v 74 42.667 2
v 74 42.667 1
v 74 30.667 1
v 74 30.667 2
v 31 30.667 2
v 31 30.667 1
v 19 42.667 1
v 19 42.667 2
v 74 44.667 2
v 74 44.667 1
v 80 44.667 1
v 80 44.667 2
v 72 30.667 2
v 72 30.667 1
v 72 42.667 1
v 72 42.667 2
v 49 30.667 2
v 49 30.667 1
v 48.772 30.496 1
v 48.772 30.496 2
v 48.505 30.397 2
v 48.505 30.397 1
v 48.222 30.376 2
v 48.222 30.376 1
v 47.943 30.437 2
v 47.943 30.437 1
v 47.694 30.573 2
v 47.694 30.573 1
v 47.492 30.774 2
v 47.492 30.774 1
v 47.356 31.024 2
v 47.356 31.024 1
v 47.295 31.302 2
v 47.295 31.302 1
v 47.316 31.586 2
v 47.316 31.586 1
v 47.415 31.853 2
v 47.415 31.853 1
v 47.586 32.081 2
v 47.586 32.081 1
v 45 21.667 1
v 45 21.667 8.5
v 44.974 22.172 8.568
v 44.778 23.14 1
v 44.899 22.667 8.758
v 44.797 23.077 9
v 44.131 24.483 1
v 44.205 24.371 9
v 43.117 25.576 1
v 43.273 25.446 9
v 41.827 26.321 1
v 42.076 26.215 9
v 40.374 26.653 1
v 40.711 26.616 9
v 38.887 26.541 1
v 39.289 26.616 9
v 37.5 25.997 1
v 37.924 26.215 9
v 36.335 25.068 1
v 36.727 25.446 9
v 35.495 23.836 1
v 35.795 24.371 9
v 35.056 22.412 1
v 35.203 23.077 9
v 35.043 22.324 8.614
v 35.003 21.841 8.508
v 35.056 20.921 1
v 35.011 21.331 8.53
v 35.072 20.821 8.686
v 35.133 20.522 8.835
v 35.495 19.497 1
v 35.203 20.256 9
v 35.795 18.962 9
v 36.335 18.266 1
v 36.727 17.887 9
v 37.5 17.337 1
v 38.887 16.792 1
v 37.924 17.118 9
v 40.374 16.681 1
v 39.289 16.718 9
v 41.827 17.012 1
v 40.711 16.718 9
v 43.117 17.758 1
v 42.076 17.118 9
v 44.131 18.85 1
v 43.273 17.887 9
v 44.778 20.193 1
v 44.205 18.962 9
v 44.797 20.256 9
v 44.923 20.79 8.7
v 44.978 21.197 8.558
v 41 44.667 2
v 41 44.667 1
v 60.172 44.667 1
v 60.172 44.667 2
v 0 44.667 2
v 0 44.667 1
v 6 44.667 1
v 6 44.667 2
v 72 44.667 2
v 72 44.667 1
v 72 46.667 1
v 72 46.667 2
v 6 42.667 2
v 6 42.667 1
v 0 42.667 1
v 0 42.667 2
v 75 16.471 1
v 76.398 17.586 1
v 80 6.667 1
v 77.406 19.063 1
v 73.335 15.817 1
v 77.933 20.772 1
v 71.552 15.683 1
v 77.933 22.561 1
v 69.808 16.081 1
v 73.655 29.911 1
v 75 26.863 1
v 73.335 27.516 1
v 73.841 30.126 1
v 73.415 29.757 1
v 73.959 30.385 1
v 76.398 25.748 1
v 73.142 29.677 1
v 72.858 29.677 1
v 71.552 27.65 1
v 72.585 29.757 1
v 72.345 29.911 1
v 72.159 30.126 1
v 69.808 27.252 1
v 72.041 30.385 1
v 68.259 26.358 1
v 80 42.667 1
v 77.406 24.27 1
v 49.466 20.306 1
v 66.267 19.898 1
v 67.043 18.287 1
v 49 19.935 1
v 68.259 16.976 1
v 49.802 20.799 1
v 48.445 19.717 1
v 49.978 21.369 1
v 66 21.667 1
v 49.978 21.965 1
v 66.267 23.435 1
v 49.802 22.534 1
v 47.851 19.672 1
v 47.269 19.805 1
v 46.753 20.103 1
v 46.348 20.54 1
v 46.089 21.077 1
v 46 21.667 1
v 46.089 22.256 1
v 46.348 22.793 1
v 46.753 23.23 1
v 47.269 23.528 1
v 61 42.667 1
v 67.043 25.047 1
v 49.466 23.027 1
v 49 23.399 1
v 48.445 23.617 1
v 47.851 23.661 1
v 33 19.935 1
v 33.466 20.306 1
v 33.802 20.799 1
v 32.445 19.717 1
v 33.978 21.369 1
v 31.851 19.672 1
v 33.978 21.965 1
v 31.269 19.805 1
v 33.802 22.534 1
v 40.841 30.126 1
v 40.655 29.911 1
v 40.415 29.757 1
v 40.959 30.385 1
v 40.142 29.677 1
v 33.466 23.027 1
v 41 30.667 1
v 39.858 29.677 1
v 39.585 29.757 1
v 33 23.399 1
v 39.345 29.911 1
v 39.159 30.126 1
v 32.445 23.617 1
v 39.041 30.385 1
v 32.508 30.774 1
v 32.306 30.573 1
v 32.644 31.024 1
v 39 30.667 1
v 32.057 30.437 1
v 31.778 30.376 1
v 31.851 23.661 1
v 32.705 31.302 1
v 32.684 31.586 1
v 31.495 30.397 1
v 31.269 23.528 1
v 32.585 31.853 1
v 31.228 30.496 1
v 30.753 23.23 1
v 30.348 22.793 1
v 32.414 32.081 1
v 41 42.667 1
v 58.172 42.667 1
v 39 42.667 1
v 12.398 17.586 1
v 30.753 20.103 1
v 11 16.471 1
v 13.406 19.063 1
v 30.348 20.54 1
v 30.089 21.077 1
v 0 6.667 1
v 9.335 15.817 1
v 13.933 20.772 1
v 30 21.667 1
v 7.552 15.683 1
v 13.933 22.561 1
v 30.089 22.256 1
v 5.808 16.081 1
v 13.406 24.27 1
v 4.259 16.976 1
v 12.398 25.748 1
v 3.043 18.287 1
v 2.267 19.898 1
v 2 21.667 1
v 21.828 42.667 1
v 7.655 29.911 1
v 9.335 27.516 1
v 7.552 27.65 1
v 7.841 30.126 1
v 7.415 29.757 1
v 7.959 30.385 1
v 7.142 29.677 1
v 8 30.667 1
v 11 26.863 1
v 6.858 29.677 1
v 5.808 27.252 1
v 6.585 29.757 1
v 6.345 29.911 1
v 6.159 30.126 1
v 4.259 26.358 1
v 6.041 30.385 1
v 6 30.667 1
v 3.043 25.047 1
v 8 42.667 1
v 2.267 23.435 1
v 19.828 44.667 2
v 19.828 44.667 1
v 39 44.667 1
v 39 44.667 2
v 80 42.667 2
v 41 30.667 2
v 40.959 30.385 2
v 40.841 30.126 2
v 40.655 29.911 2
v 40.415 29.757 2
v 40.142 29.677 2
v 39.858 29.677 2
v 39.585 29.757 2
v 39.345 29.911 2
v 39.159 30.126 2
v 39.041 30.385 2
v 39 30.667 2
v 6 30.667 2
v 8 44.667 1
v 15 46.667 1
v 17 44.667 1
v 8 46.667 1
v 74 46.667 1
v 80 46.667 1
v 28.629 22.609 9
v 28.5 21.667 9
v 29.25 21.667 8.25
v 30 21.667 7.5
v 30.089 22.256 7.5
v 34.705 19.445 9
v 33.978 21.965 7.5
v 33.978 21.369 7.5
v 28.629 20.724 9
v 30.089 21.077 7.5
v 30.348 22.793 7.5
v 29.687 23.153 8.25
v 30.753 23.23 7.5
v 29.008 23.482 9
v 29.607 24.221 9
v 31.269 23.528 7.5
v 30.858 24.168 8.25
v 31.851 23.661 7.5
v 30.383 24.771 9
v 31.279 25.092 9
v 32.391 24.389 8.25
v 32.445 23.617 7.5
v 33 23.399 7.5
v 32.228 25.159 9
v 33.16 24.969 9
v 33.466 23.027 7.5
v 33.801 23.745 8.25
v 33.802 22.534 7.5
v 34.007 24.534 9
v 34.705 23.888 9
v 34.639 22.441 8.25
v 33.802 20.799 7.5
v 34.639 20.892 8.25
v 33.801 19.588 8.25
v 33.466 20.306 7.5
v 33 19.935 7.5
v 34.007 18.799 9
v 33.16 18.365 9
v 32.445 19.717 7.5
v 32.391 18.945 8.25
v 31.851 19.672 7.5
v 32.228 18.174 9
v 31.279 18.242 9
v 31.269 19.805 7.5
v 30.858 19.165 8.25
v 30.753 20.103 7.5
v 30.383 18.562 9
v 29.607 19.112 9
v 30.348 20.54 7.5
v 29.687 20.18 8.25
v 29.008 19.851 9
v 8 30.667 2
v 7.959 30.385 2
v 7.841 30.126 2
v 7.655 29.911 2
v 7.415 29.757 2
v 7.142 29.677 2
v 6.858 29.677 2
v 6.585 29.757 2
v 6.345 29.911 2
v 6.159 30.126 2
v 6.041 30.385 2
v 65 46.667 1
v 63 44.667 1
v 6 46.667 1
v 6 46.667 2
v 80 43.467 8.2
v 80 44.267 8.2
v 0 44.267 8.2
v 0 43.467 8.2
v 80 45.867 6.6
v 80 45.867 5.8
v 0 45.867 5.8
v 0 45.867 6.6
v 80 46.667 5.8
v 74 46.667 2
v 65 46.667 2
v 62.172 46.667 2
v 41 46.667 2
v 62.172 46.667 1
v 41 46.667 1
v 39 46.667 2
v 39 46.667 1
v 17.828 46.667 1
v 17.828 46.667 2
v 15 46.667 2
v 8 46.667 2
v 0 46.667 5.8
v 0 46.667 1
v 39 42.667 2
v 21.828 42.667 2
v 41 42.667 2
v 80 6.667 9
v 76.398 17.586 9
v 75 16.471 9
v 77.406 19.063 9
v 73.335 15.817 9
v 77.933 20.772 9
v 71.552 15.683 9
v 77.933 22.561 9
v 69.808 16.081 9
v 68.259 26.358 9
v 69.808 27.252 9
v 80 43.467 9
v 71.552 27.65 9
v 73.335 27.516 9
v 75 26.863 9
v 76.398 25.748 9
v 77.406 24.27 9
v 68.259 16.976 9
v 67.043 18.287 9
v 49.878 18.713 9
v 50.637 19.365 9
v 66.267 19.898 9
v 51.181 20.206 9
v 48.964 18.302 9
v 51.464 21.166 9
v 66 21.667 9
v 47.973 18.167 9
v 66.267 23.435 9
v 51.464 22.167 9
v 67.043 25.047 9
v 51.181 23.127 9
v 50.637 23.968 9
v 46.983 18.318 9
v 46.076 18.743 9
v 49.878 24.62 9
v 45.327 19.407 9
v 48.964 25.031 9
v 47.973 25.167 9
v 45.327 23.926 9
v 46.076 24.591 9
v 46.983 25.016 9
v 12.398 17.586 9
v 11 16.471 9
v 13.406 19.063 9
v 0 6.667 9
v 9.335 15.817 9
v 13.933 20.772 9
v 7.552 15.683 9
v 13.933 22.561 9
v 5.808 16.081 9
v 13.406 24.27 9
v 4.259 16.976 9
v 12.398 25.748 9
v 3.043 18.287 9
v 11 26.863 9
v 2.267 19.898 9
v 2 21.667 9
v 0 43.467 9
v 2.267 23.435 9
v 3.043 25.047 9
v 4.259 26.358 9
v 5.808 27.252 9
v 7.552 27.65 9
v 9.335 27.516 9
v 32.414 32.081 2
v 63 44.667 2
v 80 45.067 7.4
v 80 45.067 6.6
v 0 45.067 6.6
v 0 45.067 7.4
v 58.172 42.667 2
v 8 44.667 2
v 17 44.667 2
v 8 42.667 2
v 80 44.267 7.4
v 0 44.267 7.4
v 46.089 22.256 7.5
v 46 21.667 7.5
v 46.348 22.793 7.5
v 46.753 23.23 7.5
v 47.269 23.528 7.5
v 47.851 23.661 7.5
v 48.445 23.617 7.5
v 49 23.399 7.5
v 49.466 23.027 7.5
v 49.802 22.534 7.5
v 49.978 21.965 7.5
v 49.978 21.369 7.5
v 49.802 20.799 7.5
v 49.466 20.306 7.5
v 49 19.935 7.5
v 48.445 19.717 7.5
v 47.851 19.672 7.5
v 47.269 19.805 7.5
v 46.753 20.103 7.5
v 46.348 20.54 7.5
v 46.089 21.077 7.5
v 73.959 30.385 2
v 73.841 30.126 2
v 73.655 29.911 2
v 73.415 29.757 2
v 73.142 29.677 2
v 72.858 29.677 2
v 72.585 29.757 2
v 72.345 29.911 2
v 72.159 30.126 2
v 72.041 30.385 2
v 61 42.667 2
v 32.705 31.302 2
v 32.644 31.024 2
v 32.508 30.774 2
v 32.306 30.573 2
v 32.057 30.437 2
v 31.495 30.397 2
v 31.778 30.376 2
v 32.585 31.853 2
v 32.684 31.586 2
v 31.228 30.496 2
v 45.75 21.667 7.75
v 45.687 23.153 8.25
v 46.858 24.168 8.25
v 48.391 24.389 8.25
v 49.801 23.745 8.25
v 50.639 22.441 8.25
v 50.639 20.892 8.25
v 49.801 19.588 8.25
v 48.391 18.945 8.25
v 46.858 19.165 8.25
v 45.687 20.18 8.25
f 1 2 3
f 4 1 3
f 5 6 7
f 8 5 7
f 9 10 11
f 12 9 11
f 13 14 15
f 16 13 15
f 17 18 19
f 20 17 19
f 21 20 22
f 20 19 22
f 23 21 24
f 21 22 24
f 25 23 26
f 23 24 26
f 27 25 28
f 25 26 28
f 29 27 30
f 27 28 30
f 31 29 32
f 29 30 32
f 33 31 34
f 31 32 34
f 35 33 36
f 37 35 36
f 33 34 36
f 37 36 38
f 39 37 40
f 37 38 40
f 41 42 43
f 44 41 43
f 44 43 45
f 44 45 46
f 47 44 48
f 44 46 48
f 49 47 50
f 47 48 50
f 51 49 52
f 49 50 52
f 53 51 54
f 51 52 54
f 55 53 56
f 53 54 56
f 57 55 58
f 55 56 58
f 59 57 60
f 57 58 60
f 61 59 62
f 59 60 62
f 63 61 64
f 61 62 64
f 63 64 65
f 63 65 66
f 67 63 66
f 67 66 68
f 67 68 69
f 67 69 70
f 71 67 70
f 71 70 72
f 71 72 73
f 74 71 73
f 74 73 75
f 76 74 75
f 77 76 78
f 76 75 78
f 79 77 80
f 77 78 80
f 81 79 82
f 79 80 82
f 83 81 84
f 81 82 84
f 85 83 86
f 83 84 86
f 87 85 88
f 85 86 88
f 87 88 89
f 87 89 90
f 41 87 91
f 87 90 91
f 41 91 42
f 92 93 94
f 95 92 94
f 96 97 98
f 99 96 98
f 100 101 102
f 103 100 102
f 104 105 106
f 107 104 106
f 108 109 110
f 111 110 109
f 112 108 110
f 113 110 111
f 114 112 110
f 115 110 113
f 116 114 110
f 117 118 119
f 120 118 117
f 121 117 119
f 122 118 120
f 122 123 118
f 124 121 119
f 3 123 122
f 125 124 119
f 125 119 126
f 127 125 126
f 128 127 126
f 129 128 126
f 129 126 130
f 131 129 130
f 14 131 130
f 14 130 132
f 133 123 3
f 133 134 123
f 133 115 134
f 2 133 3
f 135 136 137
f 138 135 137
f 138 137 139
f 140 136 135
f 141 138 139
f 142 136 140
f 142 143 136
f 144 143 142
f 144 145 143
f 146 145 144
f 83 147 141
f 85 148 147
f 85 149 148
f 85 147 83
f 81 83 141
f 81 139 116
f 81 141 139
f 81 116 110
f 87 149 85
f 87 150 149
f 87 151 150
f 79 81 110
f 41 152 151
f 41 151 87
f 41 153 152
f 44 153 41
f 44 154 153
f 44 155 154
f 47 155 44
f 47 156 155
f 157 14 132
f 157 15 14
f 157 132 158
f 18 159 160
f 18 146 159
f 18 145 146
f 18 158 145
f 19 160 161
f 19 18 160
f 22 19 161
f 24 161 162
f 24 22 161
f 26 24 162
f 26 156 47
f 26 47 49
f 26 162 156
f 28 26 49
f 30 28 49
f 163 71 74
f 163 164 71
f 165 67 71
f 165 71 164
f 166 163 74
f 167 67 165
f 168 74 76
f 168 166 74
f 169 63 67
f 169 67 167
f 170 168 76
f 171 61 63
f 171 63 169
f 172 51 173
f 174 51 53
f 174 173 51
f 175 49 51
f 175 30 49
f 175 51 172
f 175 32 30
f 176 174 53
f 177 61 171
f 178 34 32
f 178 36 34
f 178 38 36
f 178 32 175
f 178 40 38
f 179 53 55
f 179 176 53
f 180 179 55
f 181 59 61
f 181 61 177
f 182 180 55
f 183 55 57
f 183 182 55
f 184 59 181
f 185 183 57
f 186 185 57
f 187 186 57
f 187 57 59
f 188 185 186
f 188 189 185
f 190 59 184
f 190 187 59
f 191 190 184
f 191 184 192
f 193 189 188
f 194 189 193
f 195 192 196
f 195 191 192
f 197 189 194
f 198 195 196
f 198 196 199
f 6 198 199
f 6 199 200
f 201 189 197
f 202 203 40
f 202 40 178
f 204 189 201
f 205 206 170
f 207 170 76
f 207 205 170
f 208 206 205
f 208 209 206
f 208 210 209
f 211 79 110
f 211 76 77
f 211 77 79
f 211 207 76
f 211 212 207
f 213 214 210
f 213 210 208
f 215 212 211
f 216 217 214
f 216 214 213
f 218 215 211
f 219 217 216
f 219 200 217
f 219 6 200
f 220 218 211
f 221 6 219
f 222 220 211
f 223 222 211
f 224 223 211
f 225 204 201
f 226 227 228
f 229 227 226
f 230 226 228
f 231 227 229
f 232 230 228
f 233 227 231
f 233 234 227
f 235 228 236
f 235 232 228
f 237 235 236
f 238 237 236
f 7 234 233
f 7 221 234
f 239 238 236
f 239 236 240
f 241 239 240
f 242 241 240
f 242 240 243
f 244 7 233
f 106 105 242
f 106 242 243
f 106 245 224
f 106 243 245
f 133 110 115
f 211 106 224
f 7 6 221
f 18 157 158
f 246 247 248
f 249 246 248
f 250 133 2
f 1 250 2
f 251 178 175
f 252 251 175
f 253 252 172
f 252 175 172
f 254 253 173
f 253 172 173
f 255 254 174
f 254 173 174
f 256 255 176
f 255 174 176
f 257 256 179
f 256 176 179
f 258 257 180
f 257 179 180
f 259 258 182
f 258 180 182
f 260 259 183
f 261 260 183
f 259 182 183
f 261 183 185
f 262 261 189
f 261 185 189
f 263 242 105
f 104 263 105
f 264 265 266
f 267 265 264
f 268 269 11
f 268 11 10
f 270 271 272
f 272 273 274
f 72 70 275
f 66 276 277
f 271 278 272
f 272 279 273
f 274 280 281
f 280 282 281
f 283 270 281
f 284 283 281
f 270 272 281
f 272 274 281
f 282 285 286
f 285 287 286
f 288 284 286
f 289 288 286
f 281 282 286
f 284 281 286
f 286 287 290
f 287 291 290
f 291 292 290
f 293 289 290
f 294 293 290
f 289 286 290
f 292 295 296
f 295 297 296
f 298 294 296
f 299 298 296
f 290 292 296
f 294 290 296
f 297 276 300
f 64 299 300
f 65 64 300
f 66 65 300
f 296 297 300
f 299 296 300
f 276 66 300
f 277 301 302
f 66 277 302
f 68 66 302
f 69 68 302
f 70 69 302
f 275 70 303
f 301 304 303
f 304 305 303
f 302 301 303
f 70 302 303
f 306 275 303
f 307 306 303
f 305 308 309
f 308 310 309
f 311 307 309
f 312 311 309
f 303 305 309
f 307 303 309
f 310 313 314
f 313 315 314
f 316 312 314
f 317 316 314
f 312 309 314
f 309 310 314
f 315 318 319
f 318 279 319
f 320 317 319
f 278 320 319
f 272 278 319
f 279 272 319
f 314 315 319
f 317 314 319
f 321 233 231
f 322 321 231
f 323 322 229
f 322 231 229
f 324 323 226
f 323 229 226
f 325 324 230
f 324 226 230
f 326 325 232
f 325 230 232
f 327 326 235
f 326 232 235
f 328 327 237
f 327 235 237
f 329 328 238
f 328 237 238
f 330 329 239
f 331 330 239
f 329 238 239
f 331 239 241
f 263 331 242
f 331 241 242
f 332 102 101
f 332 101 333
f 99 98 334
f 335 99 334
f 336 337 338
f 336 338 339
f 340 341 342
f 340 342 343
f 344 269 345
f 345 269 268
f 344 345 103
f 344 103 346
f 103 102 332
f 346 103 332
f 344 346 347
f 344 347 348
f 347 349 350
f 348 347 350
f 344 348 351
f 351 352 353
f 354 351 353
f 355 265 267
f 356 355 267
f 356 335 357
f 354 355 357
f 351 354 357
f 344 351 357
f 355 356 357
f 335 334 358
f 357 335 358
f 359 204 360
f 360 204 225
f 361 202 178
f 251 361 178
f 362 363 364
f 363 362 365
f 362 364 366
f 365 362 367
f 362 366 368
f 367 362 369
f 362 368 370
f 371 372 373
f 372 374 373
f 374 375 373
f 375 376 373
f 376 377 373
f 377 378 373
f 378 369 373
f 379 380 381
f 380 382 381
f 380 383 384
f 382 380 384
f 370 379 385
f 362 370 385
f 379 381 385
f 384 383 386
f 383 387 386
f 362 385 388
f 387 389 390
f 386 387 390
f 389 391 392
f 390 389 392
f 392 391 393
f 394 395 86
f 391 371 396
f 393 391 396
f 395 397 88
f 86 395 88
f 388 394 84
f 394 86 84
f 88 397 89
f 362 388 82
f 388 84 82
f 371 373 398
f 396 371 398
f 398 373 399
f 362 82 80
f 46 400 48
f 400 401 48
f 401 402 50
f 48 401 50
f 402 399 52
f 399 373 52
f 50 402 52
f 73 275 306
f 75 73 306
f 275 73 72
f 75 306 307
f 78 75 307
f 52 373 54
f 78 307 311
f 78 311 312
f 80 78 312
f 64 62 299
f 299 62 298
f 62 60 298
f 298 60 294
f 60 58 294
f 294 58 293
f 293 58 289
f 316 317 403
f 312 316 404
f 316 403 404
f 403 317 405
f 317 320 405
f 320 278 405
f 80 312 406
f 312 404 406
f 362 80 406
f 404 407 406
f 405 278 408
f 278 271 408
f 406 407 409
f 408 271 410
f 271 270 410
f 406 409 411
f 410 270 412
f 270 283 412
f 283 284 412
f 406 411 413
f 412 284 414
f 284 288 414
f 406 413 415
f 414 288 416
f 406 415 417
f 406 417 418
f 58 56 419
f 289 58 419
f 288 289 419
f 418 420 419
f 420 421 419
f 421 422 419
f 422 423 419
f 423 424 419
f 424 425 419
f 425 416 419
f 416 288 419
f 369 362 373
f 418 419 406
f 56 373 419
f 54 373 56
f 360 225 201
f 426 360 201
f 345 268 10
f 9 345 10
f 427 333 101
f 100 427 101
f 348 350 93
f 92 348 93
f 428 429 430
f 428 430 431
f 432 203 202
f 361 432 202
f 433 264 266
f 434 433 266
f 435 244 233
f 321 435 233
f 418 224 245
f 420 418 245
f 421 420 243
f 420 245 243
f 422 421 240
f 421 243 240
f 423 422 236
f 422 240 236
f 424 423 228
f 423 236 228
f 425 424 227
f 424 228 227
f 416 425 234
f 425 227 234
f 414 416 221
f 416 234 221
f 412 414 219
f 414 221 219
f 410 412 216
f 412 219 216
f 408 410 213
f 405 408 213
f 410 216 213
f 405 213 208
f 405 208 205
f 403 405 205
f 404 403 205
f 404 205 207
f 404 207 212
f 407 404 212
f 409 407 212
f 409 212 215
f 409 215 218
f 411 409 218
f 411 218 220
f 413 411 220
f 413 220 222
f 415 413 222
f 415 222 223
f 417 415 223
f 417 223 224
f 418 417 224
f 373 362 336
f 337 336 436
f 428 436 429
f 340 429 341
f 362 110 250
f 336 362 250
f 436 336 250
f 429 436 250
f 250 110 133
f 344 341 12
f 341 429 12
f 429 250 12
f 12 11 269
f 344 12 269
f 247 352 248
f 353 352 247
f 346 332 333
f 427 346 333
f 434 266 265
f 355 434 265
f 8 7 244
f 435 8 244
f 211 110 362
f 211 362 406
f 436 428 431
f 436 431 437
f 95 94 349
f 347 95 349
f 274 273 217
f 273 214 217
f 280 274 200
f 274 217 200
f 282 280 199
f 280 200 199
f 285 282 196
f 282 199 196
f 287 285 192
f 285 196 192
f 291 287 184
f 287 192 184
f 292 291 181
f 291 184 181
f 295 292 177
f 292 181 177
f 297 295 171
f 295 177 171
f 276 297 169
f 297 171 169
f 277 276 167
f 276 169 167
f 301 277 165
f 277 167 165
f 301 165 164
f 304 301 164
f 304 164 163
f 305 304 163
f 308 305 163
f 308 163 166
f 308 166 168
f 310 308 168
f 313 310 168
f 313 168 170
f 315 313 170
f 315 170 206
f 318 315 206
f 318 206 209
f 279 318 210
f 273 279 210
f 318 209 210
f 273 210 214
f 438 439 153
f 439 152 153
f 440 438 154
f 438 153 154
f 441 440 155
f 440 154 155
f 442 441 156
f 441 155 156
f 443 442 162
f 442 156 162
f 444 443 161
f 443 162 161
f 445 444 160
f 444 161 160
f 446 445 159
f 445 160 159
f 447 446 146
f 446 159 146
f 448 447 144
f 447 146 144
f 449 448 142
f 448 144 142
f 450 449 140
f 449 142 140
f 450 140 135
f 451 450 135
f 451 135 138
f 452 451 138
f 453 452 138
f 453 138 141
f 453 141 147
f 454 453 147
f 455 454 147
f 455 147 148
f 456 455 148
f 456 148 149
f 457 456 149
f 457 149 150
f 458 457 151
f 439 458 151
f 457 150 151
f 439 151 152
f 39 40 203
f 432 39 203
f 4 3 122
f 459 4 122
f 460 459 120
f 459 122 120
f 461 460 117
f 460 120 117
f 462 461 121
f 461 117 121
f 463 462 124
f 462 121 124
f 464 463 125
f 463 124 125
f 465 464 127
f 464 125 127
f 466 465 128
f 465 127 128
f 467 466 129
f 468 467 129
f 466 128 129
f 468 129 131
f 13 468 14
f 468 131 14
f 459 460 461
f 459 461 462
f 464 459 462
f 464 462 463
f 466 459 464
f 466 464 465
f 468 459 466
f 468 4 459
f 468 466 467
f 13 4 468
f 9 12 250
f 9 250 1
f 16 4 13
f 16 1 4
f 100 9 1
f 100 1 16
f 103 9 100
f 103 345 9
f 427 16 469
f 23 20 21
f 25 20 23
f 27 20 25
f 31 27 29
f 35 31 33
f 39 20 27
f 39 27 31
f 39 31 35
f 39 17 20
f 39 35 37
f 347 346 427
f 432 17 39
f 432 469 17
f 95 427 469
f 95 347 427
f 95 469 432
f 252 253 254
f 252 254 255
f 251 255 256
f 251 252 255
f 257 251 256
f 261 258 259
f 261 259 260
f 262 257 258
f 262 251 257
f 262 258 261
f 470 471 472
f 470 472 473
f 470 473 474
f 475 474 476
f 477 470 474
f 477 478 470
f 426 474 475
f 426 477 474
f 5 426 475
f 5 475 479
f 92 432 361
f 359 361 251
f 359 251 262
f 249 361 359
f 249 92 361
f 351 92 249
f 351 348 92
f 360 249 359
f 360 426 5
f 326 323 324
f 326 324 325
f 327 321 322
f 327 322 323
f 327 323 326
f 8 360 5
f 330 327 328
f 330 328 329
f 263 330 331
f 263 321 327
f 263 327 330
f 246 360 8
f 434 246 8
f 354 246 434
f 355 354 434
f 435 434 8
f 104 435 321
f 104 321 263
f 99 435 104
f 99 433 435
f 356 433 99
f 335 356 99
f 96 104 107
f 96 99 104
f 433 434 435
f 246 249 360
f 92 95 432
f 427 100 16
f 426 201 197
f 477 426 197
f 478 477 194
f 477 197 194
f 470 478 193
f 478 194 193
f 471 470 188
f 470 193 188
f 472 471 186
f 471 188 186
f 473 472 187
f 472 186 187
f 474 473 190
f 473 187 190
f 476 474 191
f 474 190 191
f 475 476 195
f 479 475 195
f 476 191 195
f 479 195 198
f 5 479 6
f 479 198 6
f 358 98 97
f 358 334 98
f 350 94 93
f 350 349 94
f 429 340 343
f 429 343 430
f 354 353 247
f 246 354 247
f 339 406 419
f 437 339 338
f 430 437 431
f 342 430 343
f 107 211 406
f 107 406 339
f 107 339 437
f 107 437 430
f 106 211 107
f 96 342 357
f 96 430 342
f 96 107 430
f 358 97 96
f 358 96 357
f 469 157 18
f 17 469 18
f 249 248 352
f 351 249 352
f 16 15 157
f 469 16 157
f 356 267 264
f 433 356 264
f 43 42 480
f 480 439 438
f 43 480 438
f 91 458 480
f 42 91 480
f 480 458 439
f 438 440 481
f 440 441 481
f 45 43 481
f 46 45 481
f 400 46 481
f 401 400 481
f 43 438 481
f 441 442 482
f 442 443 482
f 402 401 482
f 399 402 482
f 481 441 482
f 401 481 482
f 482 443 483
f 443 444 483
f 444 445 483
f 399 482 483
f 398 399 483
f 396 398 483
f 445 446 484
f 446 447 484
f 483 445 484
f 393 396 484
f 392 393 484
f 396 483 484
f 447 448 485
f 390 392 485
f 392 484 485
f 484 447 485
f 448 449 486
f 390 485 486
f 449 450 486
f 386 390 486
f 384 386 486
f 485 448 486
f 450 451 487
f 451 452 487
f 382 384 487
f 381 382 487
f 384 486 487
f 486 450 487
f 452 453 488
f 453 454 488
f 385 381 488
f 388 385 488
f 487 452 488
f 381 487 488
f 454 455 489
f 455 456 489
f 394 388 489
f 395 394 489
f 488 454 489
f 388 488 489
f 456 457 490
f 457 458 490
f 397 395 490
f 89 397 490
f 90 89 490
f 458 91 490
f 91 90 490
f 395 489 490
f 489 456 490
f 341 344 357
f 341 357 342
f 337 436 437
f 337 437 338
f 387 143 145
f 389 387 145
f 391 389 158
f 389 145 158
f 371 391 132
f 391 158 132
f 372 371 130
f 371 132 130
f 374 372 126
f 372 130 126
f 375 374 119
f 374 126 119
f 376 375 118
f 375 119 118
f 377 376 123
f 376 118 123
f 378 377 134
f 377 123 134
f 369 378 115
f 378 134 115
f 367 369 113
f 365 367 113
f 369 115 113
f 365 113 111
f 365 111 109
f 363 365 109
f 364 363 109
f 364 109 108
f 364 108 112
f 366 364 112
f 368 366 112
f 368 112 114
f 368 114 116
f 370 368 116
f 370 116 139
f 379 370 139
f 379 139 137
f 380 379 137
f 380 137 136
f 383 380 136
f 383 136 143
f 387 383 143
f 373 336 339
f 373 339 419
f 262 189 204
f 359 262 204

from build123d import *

# Parameters (mm, degrees)
SKETCH_1_W                     = 80
SKETCH_1_H                     = 60
EXTRUDE_1_DEPTH                = 8
HOLE_WIZARD_12_0_12_1_D        = 12
HOLE_WIZARD_10_0_10_2_D        = 10
HOLE_WIZARD_M3_5_1_D           = 4
HOLE_WIZARD_M3_5_1_CSINK_D     = 7
HOLE_WIZARD_M3_5_1_CSINK_ANGLE = 90
CUT_EXTRUDE_1_DEPTH            = 1
CUT_EXTRUDE_2_REACH            = 95.053
CUT_EXTRUDE_3_REACH            = 94.961
SKETCH_29_W                    = 80
SKETCH_29_H                    = 20


with BuildPart() as part:
    # 草图1 → 凸台-拉伸1 (new body)
    with BuildSketch(Plane(origin=(0, 0, 1), x_dir=(-1, 0, 0), z_dir=(0, 0, -1))):
        with Locations((-40, 16.666666667)):
            Rectangle(SKETCH_1_W, SKETCH_1_H)
    extrude(amount=-EXTRUDE_1_DEPTH)

    # Ø12.0 (12) 直径孔1 (through all)
    with Locations(Plane.XY.offset(9)):
        with Locations((72, 21.666666667), (8, 21.666666667)):
            Hole(HOLE_WIZARD_12_0_12_1_D / 2)

    # Ø10.0 (10) 直径孔2 (through all)
    with Locations(Plane(origin=(0, 0, 1), x_dir=(-1, 0, 0), z_dir=(0, 0, -1))):
        with Locations((-40, 21.666666667)):
            Hole(HOLE_WIZARD_10_0_10_2_D / 2)

    # M3.5 平头机械螺钉的锥形沉头孔1 (through all)
    with Locations(Plane.XY.offset(9)):
        with Locations((32, 21.666666667), (48, 21.666666667)):
            CounterSinkHole(HOLE_WIZARD_M3_5_1_D / 2, HOLE_WIZARD_M3_5_1_CSINK_D / 2, counter_sink_angle=HOLE_WIZARD_M3_5_1_CSINK_ANGLE)

    # 草图27 → 切除-拉伸1 (cut)
    with BuildSketch(Plane(origin=(0, 0, 1), x_dir=(-1, 0, 0), z_dir=(0, 0, -1))):
        with BuildLine():
            ThreePointArc((-41, 30.666666667), (-40, 29.666666667), (-39, 30.666666667))
            Line((-39, 30.666666667), (-39, 42.666666667))
            Line((-39, 42.666666667), (-21.828427125, 42.666666667))
            Line((-21.828427125, 42.666666667), (-32.414213562, 32.080880229))
            ThreePointArc((-32.414213562, 32.080880229), (-32.414213562, 30.666666667), (-31, 30.666666667))
            Line((-31, 30.666666667), (-19, 42.666666667))
            Line((-19, 42.666666667), (-8, 42.666666667))
            Line((-8, 42.666666667), (-8, 30.666666667))
            ThreePointArc((-8, 30.666666667), (-7, 29.666666667), (-6, 30.666666667))
            Line((-6, 30.666666667), (-6, 42.666666667))
            Line((-6, 42.666666667), (0, 42.666666667))
            Line((0, 42.666666667), (0, 44.666666667))
            Line((0, 44.666666667), (-6, 44.666666667))
            Line((-6, 44.666666667), (-6, 46.666666667))
            Line((-6, 46.666666667), (-8, 46.666666667))
            Line((-8, 46.666666667), (-8, 44.666666667))
            Line((-8, 44.666666667), (-17, 44.666666667))
            Line((-17, 44.666666667), (-15, 46.666666667))
            Line((-15, 46.666666667), (-16.414213562, 48.080880229))
            Line((-16.414213562, 48.080880229), (-19.828427125, 44.666666667))
            Line((-19.828427125, 44.666666667), (-39, 44.666666667))
            Line((-39, 44.666666667), (-39, 46.666666667))
            Line((-39, 46.666666667), (-41, 46.666666667))
            Line((-41, 46.666666667), (-41, 44.666666667))
            Line((-41, 44.666666667), (-60.171572875, 44.666666667))
            Line((-60.171572875, 44.666666667), (-63.585786438, 48.080880229))
            Line((-63.585786438, 48.080880229), (-65, 46.666666667))
            Line((-65, 46.666666667), (-63, 44.666666667))
            Line((-63, 44.666666667), (-72, 44.666666667))
            Line((-72, 44.666666667), (-72, 46.666666667))
            Line((-72, 46.666666667), (-74, 46.666666667))
            Line((-74, 46.666666667), (-74, 44.666666667))
            Line((-74, 44.666666667), (-80, 44.666666667))
            Line((-80, 44.666666667), (-80, 42.666666667))
            Line((-80, 42.666666667), (-74, 42.666666667))
            Line((-74, 42.666666667), (-74, 30.666666667))
            ThreePointArc((-74, 30.666666667), (-73, 29.666666667), (-72, 30.666666667))
            Line((-72, 30.666666667), (-72, 42.666666667))
            Line((-72, 42.666666667), (-61, 42.666666667))
            Line((-61, 42.666666667), (-49, 30.666666667))
            ThreePointArc((-49, 30.666666667), (-47.585786438, 30.666666667), (-47.585786438, 32.080880229))
            Line((-47.585786438, 32.080880229), (-58.171572875, 42.666666667))
            Line((-58.171572875, 42.666666667), (-41, 42.666666667))
            Line((-41, 42.666666667), (-41, 30.666666667))
        make_face()
    extrude(amount=-CUT_EXTRUDE_1_DEPTH, mode=Mode.SUBTRACT)

    # 草图28 → 切除-拉伸2 (cut, up to next)
    with BuildSketch(Plane.ZY, mode=Mode.PRIVATE) as cut_extrude_2_sk1:
        Polygon((9, 46.666666667), (5.8, 46.666666667), (5.8, 45.866666667), (6.6, 45.866666667), (6.6, 45.066666667), (7.4, 45.066666667), (7.4, 44.266666667), (8.2, 44.266666667), (8.2, 43.466666667), (9, 43.466666667), align=None)
    cut_extrude_2_tool1 = extrude(cut_extrude_2_sk1.sketch, amount=-CUT_EXTRUDE_2_REACH, mode=Mode.PRIVATE) & part.part
    add(cut_extrude_2_tool1.solids().sort_by_distance((0, 45.466667, 7.8))[0], mode=Mode.SUBTRACT)

    # 草图29 → 切除-拉伸3 (cut, up to next)
    with BuildSketch(Plane(origin=(0, 0, 1), x_dir=(-1, 0, 0), z_dir=(0, 0, -1)), mode=Mode.PRIVATE) as cut_extrude_3_sk1:
        with Locations((-40, -3.333333333)):
            Rectangle(SKETCH_29_W, SKETCH_29_H)
    cut_extrude_3_tool1 = extrude(cut_extrude_3_sk1.sketch, amount=-CUT_EXTRUDE_3_REACH, mode=Mode.PRIVATE) & part.part
    add(cut_extrude_3_tool1.solids().sort_by_distance((40, -3.333333, 1))[0], mode=Mode.SUBTRACT)


solid = part.part
